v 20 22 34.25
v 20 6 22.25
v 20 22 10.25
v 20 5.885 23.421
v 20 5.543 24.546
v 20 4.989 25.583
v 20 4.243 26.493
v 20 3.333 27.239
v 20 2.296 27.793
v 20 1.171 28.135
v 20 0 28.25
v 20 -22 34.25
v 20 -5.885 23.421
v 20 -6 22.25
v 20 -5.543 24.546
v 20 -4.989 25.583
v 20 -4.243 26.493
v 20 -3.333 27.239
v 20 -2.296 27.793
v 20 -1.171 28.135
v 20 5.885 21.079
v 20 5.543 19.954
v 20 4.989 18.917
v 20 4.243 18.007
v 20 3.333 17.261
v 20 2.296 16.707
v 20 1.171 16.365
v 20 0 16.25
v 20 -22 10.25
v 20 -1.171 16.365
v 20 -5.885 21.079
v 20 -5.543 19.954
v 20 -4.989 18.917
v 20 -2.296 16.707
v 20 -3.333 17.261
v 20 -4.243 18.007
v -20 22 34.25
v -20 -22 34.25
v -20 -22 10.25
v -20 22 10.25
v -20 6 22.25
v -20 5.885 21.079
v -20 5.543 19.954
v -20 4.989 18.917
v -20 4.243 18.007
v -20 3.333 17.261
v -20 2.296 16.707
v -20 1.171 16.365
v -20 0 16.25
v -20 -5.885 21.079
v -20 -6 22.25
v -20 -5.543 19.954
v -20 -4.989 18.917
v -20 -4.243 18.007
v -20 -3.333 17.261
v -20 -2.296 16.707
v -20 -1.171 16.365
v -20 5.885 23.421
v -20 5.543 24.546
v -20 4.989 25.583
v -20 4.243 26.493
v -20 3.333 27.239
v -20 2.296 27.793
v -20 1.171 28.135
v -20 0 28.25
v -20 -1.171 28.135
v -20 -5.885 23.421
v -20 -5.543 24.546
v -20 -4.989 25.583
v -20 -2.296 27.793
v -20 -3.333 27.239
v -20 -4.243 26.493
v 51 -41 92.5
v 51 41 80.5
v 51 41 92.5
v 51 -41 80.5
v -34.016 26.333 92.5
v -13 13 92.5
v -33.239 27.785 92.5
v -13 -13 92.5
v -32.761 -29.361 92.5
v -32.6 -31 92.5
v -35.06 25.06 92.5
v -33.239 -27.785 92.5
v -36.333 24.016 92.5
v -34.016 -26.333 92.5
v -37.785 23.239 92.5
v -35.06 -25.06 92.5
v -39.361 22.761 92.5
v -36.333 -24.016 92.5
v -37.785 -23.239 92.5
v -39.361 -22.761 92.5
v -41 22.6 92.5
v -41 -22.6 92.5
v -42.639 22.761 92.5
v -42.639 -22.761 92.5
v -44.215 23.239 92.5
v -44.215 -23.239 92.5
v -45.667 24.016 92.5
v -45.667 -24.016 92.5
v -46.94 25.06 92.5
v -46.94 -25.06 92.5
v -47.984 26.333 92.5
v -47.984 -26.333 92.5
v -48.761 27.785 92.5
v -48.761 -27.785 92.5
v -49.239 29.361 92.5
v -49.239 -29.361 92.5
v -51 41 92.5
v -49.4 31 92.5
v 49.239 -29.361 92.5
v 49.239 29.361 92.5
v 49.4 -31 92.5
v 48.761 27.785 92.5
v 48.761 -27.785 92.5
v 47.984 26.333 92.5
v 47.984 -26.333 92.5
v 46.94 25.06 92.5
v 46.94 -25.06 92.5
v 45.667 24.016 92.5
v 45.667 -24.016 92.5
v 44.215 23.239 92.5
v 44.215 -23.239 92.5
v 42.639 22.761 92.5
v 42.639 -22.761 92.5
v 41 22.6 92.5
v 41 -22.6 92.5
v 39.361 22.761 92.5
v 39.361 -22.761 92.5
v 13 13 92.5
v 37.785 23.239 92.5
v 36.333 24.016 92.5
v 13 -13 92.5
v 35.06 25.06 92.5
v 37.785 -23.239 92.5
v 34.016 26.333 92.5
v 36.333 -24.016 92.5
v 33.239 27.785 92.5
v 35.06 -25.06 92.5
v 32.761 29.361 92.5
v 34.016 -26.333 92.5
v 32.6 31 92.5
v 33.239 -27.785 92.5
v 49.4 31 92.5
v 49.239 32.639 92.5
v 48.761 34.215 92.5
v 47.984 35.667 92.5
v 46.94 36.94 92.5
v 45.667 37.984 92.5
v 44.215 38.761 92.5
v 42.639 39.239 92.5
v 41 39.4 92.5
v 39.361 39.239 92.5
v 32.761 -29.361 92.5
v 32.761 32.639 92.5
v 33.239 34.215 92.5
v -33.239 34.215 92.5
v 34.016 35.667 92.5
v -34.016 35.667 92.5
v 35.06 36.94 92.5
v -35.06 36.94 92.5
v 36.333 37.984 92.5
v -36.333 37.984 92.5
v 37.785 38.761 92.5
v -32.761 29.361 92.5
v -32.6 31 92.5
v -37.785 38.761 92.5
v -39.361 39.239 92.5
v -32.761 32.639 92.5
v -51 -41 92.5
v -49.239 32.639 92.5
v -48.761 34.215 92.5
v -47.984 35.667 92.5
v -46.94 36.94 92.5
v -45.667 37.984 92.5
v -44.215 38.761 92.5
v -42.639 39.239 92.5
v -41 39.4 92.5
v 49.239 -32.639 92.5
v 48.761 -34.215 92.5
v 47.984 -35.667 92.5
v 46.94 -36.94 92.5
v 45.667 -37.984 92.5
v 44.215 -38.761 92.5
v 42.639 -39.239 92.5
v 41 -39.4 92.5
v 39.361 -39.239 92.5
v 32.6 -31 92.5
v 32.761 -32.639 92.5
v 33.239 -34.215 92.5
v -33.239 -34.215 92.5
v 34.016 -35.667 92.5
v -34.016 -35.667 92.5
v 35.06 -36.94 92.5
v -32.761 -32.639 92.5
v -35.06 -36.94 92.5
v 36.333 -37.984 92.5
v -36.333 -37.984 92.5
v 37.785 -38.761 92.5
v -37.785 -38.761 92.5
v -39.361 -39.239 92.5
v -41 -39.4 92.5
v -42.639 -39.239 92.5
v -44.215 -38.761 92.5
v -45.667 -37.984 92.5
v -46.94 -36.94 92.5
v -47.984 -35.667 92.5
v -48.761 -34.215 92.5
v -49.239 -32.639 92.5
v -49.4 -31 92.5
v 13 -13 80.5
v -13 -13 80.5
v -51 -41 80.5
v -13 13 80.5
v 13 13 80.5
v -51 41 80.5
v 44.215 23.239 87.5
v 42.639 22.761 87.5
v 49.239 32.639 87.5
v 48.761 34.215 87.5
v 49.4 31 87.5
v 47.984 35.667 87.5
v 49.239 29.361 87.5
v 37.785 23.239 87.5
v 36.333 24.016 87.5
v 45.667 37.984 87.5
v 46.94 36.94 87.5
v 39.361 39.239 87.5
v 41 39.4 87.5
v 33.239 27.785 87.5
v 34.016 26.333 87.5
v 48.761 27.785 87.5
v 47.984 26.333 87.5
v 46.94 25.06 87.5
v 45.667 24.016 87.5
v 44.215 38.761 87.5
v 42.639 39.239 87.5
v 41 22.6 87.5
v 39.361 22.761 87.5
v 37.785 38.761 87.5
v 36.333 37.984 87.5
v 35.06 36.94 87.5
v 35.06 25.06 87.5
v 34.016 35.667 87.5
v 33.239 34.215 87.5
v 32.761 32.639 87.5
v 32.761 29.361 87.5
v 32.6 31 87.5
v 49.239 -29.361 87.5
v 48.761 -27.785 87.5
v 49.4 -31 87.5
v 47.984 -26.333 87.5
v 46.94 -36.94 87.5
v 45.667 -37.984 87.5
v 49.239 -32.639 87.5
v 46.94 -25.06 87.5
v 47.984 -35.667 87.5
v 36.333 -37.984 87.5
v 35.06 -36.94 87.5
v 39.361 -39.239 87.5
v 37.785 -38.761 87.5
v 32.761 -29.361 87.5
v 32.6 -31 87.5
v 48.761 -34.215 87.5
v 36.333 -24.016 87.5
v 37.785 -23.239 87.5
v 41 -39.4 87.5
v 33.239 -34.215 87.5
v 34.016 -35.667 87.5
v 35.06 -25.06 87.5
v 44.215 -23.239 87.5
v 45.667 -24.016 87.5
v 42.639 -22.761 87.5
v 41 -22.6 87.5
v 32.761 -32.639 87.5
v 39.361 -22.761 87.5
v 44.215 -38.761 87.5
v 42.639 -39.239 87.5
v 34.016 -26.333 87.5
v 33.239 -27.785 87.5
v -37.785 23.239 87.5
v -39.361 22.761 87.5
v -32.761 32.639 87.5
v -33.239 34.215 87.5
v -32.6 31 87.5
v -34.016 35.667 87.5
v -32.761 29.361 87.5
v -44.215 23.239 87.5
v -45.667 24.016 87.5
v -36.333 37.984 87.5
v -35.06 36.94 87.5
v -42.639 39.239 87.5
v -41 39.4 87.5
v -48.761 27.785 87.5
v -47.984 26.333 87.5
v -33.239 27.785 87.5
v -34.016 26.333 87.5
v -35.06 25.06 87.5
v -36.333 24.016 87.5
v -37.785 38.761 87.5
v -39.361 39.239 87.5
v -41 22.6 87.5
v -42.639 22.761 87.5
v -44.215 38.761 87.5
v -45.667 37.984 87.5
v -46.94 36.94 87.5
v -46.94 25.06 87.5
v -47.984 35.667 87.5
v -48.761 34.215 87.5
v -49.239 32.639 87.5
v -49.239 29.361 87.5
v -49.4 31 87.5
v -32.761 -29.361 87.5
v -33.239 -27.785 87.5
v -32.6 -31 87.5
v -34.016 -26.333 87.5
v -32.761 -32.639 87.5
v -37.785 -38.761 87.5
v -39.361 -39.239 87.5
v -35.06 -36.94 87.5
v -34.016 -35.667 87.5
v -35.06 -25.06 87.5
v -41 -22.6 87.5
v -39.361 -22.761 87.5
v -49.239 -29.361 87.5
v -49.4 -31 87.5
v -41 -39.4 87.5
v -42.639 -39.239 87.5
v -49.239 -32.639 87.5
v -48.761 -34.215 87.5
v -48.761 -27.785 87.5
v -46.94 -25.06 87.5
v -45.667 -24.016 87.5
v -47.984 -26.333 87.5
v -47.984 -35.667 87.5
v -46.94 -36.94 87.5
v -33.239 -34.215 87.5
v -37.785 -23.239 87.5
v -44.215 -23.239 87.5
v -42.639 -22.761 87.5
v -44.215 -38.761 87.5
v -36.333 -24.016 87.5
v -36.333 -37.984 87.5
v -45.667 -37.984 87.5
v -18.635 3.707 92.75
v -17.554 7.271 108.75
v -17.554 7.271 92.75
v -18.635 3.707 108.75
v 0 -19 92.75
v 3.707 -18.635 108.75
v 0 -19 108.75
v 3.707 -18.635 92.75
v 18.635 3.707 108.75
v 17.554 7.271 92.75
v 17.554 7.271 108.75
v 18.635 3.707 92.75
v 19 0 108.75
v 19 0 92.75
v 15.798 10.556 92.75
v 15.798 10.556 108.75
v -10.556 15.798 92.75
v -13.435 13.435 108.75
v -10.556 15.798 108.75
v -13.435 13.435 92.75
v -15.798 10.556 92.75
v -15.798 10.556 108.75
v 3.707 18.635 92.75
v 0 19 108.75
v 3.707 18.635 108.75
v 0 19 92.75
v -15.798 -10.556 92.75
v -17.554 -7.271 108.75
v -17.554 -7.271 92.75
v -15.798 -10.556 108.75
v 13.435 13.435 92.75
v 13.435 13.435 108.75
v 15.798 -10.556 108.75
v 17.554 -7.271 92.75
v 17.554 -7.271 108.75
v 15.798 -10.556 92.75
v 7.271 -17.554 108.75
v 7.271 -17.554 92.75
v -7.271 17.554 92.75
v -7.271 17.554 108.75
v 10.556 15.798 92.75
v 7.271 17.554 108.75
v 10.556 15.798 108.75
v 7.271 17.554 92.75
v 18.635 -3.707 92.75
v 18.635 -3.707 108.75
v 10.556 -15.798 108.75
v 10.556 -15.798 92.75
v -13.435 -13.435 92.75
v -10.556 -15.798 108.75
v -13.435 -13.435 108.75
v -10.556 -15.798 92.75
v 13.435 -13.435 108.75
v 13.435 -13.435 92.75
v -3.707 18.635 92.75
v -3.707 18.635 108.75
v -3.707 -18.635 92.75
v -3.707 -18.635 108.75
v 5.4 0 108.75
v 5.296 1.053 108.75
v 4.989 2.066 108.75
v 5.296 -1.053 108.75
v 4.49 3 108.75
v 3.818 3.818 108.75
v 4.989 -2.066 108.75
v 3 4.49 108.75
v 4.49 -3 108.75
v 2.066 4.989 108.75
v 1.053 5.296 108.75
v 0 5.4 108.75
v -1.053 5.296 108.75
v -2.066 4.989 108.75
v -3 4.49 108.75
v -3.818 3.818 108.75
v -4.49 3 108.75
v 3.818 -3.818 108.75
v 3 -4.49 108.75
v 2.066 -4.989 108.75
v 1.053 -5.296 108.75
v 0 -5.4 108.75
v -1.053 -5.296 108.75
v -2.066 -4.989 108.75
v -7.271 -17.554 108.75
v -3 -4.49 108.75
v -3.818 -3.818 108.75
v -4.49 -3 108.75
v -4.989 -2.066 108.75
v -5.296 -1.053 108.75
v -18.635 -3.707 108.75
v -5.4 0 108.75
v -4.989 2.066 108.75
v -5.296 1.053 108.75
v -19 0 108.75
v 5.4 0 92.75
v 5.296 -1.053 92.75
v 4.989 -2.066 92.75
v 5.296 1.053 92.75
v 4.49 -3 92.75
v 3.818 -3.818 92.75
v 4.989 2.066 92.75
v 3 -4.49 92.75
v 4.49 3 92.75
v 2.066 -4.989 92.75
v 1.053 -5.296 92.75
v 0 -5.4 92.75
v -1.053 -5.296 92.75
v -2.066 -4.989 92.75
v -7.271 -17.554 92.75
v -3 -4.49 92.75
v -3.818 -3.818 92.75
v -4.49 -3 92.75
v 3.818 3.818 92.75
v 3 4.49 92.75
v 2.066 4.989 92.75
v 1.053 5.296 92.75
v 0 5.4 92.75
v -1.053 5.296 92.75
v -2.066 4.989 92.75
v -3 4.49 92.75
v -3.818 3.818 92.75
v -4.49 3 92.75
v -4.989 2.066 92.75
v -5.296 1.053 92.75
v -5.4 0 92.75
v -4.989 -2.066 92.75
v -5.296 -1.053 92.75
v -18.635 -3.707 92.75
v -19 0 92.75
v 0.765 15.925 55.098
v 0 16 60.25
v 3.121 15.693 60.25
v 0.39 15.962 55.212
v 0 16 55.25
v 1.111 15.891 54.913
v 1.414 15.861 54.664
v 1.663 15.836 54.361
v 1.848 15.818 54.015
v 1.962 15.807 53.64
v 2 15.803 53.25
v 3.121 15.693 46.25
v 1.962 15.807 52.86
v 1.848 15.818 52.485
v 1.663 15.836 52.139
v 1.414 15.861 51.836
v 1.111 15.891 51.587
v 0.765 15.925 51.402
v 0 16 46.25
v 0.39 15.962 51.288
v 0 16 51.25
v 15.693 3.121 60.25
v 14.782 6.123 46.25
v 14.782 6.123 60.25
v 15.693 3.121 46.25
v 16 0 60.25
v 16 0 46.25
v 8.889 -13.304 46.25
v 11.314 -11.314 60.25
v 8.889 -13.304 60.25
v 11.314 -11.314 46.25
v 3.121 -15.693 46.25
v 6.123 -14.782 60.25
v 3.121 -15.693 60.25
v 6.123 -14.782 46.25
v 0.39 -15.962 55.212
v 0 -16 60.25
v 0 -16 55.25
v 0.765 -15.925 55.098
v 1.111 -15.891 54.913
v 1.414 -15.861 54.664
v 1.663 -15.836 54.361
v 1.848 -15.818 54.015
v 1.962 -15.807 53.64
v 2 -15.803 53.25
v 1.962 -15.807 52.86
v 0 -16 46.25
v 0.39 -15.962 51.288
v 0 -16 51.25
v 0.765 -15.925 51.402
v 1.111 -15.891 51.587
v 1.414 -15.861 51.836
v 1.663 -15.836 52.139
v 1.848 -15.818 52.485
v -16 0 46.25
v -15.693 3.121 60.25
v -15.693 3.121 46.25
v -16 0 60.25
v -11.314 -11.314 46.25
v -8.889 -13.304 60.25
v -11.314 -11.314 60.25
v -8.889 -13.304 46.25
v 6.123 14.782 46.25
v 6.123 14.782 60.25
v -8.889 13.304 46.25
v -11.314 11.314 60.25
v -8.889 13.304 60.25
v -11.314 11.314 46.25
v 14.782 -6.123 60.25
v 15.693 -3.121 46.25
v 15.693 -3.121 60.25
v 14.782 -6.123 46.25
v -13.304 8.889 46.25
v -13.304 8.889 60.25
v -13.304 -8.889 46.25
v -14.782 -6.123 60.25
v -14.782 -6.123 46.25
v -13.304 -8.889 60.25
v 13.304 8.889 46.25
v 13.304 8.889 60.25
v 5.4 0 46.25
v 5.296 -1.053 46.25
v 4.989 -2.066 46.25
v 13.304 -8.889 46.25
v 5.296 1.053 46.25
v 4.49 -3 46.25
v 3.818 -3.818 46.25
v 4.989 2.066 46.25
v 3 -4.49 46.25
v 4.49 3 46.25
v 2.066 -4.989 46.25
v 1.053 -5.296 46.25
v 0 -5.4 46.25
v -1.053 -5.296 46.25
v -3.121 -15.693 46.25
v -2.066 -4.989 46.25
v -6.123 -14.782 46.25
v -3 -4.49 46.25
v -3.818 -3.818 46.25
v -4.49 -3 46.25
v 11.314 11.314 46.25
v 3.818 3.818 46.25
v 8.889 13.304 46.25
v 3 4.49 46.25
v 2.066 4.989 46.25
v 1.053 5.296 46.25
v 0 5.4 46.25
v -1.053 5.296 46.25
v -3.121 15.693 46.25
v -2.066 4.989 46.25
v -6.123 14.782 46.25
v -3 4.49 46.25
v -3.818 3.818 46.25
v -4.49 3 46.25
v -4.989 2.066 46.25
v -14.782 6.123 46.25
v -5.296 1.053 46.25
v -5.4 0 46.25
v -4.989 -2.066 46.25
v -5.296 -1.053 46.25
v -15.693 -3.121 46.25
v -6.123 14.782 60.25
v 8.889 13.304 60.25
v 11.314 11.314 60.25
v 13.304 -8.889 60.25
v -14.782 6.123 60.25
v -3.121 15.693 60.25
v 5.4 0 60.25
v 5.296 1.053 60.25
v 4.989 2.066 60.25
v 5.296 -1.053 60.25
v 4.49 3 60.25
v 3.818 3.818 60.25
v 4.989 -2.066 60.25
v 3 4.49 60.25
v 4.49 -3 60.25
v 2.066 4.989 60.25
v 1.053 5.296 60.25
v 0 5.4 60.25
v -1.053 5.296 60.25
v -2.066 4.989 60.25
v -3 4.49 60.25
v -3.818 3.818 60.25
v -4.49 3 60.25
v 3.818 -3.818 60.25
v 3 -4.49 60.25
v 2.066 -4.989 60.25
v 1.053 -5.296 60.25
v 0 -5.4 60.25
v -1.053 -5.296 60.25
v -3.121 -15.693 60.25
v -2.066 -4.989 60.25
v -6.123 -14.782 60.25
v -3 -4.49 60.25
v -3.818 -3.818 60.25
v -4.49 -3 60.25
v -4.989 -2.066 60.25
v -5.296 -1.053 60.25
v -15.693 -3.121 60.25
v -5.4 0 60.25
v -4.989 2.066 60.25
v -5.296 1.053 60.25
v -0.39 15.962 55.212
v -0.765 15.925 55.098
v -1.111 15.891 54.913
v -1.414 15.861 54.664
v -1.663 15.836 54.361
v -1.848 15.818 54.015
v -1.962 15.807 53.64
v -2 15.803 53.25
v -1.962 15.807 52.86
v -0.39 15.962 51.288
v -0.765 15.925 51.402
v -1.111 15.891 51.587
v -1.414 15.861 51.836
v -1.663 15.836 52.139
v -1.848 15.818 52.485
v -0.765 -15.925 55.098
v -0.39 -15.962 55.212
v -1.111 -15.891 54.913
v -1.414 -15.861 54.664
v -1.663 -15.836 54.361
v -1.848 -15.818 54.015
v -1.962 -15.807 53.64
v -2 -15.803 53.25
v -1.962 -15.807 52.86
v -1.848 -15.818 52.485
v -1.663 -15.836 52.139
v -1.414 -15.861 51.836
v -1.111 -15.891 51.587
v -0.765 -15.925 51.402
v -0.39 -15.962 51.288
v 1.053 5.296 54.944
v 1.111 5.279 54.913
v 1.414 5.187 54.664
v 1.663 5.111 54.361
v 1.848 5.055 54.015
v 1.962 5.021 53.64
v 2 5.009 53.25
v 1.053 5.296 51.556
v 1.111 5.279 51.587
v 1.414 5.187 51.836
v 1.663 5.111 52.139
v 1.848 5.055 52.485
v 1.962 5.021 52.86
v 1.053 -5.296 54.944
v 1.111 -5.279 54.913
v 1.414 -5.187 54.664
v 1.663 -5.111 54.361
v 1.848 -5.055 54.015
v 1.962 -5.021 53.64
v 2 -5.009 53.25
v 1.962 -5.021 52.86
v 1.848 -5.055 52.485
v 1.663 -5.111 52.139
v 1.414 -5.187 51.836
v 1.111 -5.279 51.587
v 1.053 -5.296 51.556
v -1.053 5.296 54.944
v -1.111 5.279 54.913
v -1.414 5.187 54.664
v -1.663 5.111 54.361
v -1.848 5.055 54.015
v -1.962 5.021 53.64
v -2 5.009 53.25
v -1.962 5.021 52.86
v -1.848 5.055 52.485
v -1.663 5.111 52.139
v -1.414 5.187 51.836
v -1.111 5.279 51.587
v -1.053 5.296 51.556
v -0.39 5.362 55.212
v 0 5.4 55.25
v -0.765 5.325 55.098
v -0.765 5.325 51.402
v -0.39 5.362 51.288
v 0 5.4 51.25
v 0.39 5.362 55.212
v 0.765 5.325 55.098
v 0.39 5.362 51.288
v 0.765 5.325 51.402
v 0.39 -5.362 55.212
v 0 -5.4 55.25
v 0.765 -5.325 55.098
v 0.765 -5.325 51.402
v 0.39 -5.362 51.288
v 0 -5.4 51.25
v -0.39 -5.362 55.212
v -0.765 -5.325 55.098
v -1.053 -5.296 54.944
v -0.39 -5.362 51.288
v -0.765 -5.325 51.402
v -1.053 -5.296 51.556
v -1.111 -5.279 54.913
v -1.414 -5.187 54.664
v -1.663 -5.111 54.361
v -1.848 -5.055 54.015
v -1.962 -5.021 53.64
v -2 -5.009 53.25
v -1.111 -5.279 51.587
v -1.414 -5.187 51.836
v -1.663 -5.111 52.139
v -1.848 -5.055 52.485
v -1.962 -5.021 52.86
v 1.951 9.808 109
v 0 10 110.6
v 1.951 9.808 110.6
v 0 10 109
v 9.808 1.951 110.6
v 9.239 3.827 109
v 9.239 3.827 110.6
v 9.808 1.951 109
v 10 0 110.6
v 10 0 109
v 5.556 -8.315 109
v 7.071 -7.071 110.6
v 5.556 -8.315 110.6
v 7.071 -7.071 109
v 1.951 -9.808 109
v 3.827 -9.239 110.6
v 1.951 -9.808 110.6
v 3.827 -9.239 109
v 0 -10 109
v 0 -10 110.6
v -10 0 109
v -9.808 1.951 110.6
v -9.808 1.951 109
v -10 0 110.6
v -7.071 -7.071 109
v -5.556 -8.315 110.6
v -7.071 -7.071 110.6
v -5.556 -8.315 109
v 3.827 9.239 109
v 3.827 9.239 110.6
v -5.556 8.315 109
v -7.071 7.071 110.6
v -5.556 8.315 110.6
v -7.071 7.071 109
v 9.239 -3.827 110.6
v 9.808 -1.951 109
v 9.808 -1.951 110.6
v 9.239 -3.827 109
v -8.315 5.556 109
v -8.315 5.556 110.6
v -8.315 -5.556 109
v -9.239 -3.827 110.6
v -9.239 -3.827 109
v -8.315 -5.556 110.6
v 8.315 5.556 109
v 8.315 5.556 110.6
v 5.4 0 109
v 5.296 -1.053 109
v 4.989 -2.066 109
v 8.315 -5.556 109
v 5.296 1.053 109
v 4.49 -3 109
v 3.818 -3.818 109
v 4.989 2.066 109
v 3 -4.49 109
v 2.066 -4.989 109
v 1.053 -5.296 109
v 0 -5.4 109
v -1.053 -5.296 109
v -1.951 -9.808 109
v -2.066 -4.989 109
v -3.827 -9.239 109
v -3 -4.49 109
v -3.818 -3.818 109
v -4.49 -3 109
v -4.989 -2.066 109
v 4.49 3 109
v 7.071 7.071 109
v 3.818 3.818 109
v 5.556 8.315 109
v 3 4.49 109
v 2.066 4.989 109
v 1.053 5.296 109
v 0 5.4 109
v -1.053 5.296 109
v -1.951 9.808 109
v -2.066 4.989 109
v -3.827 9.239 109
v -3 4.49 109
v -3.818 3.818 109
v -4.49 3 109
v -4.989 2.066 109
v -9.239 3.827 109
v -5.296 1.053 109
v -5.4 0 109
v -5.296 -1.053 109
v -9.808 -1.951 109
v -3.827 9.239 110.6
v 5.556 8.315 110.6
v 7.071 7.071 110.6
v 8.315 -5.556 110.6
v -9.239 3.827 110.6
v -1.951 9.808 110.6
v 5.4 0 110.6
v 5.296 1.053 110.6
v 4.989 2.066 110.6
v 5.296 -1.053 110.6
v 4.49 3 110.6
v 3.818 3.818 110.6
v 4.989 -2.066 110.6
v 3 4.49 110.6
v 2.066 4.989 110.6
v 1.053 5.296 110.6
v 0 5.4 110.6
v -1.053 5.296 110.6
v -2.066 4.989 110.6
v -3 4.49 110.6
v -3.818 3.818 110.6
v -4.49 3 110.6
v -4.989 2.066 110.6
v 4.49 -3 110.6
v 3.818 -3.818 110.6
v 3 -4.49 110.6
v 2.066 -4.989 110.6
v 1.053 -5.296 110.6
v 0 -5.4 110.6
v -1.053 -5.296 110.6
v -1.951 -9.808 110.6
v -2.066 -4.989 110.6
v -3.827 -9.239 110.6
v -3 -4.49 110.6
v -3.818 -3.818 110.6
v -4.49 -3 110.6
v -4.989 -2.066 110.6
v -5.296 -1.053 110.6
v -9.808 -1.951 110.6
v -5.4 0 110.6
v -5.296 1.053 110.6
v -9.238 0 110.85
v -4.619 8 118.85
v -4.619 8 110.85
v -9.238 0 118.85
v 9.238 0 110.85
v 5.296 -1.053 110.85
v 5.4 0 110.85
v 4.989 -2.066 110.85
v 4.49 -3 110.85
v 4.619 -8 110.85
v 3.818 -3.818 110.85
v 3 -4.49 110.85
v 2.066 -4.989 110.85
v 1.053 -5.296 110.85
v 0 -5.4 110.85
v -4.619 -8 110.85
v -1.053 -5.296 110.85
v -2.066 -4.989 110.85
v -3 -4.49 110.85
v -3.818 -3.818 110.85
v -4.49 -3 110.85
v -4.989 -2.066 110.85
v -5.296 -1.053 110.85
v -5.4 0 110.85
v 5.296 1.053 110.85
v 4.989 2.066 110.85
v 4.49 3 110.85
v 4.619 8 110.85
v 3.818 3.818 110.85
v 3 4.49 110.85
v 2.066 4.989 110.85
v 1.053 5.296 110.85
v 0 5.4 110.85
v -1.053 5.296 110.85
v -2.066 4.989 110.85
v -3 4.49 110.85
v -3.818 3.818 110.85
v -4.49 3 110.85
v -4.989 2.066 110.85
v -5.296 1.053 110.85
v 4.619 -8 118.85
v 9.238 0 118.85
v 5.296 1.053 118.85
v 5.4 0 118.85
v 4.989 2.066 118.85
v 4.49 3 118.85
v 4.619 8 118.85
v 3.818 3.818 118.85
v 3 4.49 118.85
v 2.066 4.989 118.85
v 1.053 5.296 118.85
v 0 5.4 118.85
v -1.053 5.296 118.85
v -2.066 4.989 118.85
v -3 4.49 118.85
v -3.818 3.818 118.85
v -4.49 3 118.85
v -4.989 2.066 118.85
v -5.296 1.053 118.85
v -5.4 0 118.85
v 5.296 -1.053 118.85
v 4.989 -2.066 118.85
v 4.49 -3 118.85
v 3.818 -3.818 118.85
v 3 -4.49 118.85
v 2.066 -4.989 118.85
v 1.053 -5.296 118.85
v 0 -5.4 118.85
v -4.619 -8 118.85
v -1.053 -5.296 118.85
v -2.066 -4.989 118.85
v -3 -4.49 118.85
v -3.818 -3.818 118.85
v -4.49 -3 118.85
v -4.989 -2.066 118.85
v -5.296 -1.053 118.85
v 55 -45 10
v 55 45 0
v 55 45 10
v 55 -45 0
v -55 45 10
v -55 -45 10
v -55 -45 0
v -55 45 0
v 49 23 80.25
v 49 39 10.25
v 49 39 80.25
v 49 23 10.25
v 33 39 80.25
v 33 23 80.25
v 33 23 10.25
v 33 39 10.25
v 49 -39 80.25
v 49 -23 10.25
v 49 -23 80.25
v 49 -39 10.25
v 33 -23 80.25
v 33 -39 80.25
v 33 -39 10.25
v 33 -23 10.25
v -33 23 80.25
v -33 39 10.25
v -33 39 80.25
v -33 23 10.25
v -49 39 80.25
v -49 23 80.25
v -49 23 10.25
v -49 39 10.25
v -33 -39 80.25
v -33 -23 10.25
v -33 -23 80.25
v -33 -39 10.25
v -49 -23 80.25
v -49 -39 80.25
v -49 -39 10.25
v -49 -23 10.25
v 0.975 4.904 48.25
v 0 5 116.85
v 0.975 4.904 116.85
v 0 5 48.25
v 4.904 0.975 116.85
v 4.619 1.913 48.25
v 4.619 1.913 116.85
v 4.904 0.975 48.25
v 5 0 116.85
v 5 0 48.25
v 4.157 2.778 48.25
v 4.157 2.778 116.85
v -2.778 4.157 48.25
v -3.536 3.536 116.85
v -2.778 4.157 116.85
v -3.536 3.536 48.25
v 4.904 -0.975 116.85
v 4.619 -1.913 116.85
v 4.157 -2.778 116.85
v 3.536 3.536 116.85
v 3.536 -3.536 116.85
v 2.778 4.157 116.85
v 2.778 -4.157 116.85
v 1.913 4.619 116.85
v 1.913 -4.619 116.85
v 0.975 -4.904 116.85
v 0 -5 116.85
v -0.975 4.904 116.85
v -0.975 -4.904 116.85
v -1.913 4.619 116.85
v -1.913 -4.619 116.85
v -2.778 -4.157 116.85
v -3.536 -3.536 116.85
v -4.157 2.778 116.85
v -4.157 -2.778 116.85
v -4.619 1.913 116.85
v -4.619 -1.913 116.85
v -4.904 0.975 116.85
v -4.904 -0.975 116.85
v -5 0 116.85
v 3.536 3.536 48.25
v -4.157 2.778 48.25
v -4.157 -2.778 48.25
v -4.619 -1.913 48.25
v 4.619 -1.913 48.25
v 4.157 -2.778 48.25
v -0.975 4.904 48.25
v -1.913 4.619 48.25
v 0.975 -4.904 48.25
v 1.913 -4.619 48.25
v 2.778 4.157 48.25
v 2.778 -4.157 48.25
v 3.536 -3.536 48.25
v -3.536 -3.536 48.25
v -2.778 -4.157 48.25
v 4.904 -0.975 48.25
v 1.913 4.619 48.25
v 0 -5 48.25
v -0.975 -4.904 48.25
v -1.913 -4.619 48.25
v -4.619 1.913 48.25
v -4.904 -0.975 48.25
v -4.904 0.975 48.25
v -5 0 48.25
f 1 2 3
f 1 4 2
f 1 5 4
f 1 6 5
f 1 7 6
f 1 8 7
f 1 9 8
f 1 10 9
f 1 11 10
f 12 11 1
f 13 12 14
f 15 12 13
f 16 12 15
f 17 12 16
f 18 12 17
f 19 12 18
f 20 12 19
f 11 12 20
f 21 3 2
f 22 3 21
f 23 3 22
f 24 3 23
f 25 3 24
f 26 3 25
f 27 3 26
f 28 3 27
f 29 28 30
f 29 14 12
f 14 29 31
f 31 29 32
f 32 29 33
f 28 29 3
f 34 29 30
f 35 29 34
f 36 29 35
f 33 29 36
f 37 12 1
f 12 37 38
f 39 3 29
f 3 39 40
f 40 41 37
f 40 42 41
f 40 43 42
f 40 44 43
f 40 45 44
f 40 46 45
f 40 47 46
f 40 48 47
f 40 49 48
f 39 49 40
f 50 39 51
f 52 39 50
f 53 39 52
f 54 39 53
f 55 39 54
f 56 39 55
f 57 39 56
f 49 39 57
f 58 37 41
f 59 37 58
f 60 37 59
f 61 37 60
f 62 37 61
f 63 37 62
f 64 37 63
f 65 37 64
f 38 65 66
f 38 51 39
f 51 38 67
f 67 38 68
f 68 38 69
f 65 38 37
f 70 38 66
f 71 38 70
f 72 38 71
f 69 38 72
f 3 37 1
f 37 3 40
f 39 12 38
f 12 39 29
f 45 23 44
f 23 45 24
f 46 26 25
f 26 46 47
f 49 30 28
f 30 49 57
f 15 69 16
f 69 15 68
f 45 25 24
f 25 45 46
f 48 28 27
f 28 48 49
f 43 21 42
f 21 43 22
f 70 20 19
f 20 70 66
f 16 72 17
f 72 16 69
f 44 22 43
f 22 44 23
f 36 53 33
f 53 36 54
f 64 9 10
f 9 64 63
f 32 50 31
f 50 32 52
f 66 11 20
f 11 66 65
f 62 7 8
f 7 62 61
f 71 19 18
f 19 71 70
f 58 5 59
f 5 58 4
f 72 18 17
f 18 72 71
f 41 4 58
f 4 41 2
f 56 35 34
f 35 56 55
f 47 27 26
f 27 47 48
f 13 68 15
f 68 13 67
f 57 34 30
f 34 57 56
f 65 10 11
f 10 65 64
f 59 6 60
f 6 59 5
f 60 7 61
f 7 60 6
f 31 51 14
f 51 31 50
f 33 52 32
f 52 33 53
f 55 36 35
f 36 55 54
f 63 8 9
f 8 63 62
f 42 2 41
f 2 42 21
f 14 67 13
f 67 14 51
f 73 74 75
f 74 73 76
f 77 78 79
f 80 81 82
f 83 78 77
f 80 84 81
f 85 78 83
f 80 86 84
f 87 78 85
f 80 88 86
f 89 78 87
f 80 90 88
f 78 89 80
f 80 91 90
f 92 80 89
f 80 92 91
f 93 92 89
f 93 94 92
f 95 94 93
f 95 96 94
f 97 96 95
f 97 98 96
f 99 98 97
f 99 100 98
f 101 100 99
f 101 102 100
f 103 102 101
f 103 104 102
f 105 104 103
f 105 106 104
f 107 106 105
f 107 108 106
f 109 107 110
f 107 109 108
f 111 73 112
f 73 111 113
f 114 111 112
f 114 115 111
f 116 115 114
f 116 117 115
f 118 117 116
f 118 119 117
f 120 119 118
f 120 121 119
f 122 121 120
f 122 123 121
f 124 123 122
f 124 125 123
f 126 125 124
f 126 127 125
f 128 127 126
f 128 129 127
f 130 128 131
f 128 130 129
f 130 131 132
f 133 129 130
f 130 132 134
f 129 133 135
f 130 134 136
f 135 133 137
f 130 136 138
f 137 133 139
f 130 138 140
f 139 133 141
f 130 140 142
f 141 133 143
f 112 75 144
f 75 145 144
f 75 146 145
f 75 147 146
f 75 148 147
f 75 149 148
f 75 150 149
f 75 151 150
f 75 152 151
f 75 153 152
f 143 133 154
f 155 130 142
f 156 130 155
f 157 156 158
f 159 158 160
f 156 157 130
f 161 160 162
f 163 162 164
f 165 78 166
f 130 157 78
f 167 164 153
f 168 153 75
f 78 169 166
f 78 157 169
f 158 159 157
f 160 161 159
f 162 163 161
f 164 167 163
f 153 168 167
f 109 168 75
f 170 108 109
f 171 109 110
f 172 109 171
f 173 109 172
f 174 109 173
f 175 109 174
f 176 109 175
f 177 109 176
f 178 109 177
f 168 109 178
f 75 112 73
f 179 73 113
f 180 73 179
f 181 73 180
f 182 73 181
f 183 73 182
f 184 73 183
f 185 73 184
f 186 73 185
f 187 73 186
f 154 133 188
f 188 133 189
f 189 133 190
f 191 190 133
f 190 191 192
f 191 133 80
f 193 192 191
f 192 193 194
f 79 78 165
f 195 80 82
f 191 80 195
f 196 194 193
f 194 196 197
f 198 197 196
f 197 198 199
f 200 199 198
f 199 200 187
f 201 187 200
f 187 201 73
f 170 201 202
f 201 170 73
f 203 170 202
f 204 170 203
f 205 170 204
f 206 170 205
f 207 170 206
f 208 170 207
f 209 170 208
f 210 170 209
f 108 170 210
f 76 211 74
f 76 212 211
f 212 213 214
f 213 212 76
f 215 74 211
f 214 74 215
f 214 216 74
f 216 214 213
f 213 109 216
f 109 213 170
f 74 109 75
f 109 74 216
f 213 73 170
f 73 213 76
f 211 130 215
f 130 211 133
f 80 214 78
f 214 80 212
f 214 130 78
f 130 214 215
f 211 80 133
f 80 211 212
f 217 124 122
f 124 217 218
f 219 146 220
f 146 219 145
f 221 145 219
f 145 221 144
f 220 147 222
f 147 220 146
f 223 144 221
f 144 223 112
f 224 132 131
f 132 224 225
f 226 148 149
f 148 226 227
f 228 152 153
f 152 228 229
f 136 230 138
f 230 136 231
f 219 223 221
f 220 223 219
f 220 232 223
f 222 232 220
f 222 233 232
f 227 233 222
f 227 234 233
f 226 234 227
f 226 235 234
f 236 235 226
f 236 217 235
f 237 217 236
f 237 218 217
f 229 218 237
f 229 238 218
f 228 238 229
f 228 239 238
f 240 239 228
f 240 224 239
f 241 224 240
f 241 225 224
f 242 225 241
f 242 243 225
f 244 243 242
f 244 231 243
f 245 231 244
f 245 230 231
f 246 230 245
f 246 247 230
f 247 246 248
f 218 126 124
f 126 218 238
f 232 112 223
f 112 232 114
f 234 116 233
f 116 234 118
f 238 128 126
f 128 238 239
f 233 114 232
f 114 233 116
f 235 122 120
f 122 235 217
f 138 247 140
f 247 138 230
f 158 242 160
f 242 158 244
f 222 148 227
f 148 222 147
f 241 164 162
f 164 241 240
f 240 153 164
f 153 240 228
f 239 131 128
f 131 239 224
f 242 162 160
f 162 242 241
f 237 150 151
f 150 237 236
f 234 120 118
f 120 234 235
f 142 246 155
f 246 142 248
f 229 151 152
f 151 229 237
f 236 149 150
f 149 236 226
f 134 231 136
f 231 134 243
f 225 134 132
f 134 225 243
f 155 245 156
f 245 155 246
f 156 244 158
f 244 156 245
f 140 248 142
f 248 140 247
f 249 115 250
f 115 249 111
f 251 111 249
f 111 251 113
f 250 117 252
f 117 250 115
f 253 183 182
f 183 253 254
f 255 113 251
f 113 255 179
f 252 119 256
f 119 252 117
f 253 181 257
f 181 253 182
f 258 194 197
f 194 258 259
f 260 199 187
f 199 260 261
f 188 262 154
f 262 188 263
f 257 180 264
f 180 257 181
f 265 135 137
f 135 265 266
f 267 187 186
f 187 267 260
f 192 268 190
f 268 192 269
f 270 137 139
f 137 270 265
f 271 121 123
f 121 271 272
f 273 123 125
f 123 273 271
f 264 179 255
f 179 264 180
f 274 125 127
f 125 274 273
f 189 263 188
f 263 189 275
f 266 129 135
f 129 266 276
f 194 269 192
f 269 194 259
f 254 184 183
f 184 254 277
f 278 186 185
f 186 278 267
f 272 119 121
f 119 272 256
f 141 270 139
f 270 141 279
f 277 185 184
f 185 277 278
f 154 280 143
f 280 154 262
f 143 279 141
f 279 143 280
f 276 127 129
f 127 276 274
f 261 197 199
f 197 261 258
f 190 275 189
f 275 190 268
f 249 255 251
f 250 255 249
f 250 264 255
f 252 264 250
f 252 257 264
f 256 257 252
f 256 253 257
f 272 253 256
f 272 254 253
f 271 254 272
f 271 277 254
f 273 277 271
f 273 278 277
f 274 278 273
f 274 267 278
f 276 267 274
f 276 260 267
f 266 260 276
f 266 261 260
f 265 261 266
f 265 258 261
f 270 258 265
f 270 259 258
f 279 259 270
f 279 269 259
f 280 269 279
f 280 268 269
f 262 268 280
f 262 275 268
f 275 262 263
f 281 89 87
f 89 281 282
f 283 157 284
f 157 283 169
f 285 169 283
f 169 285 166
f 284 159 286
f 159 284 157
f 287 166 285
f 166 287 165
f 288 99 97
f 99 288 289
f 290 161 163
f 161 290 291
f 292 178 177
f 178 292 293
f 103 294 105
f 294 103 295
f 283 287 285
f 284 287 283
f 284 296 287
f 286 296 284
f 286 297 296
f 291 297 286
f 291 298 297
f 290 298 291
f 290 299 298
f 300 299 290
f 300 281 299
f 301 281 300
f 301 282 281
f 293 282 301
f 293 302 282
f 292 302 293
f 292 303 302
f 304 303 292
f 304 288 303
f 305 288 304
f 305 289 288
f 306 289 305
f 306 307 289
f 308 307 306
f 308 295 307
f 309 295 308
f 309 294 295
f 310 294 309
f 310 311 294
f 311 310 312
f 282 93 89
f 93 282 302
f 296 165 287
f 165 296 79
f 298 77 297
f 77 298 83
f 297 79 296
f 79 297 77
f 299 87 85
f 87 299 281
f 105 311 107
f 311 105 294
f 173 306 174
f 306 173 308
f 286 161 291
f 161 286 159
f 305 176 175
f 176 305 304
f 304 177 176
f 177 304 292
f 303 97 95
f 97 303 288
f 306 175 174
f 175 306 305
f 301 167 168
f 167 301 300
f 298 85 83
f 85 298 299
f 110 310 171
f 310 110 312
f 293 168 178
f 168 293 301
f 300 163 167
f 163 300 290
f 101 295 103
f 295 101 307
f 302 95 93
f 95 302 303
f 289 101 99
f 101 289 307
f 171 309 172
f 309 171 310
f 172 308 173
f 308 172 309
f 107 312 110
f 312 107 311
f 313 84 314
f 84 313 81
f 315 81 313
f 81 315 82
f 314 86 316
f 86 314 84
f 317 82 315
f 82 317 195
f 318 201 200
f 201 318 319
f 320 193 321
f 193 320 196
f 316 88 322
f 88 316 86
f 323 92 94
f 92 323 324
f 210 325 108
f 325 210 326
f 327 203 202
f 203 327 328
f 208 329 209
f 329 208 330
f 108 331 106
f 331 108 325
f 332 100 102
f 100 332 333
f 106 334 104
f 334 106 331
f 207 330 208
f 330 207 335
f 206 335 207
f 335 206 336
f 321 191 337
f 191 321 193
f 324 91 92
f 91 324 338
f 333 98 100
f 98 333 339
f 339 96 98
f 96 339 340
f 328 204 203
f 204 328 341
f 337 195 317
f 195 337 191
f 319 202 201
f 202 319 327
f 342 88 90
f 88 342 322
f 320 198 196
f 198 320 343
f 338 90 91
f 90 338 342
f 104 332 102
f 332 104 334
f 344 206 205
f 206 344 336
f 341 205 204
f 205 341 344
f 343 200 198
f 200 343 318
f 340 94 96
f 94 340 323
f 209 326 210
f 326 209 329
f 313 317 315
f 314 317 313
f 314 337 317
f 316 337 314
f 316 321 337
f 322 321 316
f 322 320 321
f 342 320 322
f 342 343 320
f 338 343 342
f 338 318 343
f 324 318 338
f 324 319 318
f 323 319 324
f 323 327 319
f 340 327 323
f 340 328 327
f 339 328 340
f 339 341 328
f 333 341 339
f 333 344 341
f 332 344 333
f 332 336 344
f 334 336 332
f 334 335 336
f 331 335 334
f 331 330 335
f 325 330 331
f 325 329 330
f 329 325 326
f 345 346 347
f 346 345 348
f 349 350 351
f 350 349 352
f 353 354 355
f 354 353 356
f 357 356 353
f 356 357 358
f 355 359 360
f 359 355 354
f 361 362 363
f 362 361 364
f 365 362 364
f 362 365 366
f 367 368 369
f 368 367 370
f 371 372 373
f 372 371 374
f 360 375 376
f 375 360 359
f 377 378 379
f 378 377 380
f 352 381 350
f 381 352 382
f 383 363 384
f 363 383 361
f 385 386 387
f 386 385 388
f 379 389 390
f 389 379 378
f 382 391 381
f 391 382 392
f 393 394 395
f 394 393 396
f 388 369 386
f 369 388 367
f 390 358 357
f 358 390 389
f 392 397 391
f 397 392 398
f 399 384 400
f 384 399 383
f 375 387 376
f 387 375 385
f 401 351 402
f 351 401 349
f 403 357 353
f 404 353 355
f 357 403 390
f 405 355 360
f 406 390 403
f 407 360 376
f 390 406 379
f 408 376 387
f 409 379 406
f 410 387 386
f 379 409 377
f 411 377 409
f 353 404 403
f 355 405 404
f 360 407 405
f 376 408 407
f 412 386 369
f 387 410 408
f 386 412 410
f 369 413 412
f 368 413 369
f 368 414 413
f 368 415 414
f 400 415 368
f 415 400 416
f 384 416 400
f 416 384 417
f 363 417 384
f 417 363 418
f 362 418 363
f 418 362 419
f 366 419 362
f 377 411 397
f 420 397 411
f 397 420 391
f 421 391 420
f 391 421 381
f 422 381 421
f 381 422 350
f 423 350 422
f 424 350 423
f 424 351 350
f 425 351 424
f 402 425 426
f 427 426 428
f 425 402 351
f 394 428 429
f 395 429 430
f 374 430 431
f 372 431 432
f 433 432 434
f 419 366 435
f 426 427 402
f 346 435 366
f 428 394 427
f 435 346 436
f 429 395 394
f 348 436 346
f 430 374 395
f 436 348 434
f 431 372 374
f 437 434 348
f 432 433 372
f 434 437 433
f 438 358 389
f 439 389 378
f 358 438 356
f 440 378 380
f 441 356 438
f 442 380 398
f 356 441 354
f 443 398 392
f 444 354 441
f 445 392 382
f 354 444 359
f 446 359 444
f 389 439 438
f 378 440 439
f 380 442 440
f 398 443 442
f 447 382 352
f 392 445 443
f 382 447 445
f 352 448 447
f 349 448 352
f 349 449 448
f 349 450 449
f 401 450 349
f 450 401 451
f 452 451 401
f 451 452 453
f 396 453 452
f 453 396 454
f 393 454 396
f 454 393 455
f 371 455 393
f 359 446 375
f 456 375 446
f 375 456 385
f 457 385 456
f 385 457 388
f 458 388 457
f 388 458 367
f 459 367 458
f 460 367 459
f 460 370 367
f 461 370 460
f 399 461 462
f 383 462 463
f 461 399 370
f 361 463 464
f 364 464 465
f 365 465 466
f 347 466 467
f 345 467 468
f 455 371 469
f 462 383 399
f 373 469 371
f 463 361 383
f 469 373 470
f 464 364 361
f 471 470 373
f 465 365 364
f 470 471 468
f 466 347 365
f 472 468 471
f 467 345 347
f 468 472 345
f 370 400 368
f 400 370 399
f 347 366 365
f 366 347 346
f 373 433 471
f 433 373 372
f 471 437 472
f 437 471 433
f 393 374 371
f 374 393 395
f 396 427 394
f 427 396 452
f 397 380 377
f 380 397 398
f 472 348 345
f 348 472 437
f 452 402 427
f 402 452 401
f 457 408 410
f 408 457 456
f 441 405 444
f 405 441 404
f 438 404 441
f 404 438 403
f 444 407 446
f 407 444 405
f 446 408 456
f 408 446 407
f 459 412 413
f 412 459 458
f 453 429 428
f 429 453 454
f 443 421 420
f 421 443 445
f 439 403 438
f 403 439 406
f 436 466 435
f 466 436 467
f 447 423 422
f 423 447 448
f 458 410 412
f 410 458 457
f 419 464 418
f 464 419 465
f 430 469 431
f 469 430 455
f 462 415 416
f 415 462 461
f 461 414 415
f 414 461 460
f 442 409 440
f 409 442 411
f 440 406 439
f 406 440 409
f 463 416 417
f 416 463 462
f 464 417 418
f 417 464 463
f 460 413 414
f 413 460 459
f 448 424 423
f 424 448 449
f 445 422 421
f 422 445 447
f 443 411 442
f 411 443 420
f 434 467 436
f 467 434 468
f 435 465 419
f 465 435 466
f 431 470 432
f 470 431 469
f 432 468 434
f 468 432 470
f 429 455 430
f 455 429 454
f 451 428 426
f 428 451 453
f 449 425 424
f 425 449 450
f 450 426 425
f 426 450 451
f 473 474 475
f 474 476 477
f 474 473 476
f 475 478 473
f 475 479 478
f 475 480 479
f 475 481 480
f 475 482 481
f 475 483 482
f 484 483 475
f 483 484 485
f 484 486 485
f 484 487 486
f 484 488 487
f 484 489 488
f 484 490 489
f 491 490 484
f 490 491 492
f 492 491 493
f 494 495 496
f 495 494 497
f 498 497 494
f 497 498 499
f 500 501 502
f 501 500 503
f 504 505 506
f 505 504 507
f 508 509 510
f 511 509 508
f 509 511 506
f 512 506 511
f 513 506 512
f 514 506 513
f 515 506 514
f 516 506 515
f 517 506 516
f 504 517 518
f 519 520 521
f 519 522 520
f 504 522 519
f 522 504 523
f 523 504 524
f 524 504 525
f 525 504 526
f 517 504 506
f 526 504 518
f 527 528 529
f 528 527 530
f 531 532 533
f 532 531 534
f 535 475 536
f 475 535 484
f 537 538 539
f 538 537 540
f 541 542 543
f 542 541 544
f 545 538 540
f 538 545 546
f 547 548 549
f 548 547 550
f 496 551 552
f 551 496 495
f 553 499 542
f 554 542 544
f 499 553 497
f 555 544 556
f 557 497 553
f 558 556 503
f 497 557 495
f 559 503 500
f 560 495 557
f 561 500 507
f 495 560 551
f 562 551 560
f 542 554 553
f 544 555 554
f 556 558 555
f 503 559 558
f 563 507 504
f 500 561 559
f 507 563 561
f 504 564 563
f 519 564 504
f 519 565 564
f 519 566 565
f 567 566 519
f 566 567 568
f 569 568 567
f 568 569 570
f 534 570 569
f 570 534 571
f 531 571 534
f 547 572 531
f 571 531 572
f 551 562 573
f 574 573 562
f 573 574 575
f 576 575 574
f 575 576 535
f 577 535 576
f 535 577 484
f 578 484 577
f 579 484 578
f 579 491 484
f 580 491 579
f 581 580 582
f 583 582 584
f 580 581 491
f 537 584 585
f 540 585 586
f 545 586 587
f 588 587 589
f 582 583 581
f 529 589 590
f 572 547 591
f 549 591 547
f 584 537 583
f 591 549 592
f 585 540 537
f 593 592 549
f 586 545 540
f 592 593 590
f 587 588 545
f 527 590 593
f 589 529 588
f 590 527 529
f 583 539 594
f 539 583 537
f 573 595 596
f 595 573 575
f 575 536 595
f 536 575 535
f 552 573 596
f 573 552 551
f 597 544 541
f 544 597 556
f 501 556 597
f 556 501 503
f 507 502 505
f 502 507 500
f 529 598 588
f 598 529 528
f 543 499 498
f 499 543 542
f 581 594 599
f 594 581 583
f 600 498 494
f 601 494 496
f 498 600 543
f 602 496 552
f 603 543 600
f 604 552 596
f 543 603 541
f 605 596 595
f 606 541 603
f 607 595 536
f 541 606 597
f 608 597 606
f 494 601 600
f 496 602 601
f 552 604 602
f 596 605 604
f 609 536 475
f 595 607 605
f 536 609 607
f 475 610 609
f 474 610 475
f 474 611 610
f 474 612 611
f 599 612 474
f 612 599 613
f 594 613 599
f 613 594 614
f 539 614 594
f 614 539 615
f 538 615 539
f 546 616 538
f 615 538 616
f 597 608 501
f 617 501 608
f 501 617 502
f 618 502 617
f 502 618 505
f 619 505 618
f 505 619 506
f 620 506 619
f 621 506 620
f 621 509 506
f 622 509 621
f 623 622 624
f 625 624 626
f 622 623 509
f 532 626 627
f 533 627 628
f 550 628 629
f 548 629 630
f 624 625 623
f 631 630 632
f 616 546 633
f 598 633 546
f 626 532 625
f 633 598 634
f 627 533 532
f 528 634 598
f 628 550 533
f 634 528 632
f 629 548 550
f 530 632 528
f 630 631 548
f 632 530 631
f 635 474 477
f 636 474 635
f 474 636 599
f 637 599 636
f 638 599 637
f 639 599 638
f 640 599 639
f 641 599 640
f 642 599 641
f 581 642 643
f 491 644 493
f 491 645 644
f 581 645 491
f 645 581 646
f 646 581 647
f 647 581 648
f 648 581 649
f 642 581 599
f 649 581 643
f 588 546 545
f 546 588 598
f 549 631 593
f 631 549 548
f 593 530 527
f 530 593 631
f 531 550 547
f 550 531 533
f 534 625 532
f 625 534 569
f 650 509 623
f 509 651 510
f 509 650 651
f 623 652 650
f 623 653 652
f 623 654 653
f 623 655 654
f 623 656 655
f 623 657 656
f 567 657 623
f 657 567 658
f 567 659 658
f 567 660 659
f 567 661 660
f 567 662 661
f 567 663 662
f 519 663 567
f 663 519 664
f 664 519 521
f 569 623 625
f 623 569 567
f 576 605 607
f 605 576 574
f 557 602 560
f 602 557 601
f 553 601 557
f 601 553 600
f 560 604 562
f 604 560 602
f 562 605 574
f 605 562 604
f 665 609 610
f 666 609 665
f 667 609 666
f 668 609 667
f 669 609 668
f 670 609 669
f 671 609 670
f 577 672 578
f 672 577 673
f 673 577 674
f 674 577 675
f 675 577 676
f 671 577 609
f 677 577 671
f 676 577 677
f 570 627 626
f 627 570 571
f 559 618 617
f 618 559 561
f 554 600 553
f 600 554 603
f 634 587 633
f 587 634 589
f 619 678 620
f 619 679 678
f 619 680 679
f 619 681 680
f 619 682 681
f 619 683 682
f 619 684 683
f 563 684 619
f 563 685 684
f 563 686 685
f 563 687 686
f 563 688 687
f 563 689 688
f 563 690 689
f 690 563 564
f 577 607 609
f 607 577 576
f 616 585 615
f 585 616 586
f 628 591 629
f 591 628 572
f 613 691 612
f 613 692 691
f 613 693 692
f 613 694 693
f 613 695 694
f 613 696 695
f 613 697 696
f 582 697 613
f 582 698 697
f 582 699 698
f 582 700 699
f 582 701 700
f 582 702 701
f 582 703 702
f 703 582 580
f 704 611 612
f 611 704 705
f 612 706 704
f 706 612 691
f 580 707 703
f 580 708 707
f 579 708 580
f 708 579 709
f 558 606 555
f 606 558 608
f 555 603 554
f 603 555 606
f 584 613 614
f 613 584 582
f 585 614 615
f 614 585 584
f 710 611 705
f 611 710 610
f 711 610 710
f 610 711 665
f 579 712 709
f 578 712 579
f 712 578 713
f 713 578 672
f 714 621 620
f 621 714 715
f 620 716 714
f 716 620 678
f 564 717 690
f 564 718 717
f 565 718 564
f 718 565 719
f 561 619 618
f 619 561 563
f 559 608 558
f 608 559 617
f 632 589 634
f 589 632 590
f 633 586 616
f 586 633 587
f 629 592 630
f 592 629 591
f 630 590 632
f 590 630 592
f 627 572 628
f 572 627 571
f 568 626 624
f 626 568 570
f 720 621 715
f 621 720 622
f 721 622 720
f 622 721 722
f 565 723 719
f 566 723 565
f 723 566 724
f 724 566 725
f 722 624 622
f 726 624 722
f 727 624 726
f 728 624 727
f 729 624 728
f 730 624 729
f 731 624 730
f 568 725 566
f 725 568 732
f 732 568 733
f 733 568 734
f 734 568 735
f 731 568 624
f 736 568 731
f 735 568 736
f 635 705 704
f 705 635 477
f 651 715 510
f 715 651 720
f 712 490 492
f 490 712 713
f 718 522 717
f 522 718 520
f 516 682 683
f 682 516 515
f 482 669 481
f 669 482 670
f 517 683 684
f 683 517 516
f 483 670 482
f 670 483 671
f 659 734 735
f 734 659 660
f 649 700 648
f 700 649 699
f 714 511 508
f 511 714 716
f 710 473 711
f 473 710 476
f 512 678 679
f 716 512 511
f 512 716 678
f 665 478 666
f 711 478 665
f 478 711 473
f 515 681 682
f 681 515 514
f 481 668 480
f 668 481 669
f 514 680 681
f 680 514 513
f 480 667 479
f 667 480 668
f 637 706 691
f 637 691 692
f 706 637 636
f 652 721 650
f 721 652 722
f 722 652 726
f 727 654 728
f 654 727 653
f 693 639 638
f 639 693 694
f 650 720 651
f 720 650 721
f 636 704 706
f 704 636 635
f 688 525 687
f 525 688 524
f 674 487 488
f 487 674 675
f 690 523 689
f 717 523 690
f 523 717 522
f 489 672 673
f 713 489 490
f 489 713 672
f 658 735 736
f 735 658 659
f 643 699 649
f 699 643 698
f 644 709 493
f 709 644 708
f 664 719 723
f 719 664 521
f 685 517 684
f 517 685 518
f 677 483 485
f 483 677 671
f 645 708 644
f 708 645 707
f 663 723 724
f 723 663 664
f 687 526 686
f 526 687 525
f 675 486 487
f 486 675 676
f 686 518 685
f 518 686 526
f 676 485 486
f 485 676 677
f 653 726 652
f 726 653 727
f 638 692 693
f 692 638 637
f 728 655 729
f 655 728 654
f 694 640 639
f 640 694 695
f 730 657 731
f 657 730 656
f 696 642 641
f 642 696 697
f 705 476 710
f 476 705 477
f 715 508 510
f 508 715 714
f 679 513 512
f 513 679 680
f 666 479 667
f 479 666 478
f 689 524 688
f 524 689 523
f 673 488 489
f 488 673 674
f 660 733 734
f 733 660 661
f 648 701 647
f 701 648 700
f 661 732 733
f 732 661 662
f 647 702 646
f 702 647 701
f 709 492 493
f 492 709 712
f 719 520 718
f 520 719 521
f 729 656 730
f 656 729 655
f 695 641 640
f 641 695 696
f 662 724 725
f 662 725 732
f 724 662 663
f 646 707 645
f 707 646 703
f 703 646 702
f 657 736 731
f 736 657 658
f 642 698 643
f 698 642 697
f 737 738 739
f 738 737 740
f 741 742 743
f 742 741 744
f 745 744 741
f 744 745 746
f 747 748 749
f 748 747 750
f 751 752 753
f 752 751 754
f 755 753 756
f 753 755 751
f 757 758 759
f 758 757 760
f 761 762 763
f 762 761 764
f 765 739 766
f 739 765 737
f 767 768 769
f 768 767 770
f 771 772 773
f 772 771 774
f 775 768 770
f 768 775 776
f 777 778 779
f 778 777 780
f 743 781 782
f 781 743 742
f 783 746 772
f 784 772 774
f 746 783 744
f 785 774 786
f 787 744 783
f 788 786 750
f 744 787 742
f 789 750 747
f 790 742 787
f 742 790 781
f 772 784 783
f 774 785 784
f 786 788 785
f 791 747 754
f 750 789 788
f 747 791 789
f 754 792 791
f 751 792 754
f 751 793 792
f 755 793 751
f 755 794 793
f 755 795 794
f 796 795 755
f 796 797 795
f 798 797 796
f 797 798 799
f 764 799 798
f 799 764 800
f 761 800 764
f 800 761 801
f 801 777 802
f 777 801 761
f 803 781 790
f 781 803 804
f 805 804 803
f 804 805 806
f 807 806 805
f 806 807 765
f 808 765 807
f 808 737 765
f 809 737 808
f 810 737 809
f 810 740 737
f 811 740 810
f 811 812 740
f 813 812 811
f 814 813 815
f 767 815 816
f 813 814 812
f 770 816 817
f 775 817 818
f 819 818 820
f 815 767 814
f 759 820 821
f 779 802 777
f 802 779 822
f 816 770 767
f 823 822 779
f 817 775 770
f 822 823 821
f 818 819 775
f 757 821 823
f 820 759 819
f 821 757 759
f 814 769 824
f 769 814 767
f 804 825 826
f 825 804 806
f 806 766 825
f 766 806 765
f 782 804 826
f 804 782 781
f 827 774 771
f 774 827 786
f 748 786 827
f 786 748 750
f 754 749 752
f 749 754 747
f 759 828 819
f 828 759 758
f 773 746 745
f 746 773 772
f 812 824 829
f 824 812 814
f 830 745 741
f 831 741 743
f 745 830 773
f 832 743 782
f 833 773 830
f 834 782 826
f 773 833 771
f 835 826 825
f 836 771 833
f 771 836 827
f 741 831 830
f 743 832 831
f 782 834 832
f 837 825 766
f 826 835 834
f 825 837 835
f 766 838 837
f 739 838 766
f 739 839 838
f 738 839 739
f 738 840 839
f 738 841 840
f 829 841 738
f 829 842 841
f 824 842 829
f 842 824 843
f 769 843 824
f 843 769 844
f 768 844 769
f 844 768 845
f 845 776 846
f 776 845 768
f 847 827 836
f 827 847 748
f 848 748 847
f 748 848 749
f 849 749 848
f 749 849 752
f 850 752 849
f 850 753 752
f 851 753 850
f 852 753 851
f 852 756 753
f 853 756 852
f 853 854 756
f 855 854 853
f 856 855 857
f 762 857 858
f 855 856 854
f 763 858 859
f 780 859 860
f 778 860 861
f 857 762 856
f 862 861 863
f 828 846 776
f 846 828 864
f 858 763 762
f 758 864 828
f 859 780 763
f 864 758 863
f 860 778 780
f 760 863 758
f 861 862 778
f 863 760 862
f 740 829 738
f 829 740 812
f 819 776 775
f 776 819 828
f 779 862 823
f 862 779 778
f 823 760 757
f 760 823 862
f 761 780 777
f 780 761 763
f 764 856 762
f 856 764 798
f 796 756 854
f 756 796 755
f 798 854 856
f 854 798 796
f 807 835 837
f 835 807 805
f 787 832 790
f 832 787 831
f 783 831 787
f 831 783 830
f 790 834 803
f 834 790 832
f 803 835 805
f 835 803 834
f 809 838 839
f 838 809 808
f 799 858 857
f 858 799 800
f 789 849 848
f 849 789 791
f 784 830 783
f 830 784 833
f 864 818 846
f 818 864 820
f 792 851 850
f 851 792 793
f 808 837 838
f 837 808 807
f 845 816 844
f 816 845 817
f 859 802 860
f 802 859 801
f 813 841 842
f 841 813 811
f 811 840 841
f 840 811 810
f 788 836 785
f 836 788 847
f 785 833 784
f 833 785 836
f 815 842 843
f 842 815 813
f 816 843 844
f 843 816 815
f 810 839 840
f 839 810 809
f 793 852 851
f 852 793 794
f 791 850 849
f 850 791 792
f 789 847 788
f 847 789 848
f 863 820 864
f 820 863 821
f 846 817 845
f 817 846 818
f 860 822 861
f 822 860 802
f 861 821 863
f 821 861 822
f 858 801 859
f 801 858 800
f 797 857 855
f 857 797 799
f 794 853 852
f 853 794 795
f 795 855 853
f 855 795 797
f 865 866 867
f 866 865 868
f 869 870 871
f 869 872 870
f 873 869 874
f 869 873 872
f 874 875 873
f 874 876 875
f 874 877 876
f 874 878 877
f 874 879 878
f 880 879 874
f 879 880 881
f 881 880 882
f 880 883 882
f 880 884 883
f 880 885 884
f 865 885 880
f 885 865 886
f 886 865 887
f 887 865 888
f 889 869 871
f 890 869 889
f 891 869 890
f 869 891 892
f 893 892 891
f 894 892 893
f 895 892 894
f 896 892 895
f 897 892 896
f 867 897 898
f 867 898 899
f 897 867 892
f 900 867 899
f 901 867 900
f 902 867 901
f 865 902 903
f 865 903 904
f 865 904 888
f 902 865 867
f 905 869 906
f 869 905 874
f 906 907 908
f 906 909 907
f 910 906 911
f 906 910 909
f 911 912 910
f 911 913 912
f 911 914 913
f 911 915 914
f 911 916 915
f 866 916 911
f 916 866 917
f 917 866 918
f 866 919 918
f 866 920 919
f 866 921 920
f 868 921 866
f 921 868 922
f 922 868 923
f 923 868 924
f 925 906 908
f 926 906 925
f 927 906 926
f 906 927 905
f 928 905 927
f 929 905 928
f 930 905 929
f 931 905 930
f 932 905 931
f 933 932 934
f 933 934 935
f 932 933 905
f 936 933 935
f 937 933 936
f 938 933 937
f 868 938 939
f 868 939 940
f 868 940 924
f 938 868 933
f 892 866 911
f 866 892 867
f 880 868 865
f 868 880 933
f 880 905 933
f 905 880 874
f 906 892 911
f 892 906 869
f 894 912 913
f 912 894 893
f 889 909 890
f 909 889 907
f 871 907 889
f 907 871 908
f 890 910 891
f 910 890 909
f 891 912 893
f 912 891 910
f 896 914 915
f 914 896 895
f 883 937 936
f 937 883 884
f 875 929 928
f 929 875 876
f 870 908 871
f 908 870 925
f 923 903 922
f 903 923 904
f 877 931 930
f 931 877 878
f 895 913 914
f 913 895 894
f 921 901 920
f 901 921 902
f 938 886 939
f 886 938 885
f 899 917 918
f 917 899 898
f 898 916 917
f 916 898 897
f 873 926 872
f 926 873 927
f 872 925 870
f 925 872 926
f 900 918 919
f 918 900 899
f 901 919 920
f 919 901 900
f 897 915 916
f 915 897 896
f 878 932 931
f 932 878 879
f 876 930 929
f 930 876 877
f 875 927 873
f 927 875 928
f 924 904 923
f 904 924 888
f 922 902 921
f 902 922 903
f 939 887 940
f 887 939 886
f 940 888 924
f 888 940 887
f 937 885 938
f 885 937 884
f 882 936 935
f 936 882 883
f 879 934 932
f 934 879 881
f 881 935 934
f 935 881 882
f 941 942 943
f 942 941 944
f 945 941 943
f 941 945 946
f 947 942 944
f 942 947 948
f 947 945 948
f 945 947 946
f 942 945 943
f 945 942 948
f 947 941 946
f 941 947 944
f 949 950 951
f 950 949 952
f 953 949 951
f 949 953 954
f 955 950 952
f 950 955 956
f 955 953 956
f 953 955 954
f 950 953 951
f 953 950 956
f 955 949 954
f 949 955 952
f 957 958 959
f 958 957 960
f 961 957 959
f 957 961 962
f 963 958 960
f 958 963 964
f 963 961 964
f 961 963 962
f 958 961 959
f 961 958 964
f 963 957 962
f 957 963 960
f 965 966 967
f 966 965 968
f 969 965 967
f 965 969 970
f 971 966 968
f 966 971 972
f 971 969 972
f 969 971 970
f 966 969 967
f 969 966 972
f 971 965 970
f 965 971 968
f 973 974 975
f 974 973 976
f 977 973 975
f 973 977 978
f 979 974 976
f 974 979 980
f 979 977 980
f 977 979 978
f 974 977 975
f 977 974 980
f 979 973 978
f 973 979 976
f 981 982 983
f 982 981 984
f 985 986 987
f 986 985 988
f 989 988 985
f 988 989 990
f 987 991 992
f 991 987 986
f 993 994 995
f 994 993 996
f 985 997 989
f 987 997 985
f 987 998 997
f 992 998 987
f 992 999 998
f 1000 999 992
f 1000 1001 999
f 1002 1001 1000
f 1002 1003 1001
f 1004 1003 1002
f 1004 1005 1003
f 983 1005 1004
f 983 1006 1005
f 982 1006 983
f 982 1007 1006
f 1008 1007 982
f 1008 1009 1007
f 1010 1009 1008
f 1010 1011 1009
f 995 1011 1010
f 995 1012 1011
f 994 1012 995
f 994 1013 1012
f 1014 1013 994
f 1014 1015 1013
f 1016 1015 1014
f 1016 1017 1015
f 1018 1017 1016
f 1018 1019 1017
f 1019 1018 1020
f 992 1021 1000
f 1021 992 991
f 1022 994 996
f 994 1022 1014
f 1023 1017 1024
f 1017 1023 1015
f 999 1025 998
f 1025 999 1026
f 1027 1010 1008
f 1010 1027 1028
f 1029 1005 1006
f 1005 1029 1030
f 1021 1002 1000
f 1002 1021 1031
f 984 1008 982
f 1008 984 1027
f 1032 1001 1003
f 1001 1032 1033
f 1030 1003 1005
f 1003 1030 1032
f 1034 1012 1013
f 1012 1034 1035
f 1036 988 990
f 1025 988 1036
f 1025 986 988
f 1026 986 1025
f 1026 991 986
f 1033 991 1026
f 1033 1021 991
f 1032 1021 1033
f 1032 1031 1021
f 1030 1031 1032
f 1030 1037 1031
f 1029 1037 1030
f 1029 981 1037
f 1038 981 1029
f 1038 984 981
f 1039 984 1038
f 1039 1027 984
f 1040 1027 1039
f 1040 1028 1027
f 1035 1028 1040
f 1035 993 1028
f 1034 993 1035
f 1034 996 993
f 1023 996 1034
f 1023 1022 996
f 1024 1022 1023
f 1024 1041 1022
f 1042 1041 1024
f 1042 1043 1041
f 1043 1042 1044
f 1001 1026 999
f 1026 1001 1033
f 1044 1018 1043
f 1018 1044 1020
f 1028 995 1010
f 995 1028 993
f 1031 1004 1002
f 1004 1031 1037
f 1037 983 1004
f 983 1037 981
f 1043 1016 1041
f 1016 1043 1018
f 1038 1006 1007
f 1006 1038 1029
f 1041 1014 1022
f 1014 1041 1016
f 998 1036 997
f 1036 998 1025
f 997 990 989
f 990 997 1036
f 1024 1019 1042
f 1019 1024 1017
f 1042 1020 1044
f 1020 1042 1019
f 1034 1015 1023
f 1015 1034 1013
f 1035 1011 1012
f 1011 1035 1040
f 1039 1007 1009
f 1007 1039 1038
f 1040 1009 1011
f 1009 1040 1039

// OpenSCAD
$fn = 32;

// ------------------------------------------------------------------------
// Arbor press fixture: screw d10, posts 70 mm, gap 12 mm
// Every part is its own module, assembly() places every instance.
// ------------------------------------------------------------------------

// --- part 1 ---
module press_bed() {
  difference() {
    translate([-55, -45, 0]) cube([110, 90, 10]);
  }
}

// --- part 2 ---
module anvil_block() {
  difference() {
    translate([-20, -22, 0]) cube([40, 44, 24]);
    translate([0, 0, 12]) rotate([0, 90, 0]) cylinder(h = 42, d = 12, center = true);
  }
}

// --- part 3 ---
module press_post_a() {
  translate([-8, -8, 0]) cube([16, 16, 70]);
}

// --- part 4 ---
module press_post_b() {
  translate([-8, -8, 0]) cube([16, 16, 70]);
}

// --- part 5 ---
module press_post_c() {
  translate([-8, -8, 0]) cube([16, 16, 70]);
}

// --- part 6 ---
module press_post_d() {
  translate([-8, -8, 0]) cube([16, 16, 70]);
}

// --- part 7 ---
module press_frame() {
  difference() {
    translate([-51, -41, 0]) cube([102, 82, 12]);
    translate([-13, -13, -1]) cube([26, 26, 14]);
    translate([41, 31, 7]) cylinder(h = 6, d = 16.8);
    translate([41, -31, 7]) cylinder(h = 6, d = 16.8);
    translate([-41, 31, 7]) cylinder(h = 6, d = 16.8);
    translate([-41, -31, 7]) cylinder(h = 6, d = 16.8);
  }
}

// --- part 8 ---
module guide_ring() {
  difference() {
      translate([0, 0, 0]) cylinder(h = 16, d = 38);
      translate([0, 0, -1]) cylinder(h = 18, d = 10.8);
    }
}

// --- part 9 ---
module press_screw() {
  translate([0, 0, -34.3]) cylinder(h = 68.6, d = 10);
}

// --- part 10 ---
module press_head() {
  difference() {
    cylinder(h = 14, d = 32);
    translate([0, 0, -1]) cylinder(h = 16, d = 10.8);
    translate([0, 0, 7]) rotate([90, 0, 0]) cylinder(h = 34, d = 4, center = true);
  }
}

// --- part 11 ---
module nut_washer() {
  difference() {
      translate([0, 0, 0]) cylinder(h = 1.6, d = 20);
      translate([0, 0, -1]) cylinder(h = 3.6, d = 10.8);
    }
}

// --- part 12 ---
module press_nut() {
  difference() {
    linear_extrude(height = 8) polygon(points = [[9.238, 0], [4.619, 8], [-4.619, 8], [-9.238, 0], [-4.619, -8], [4.619, -8]]);
    translate([0, 0, -1]) cylinder(h = 10, d = 10.8);
  }
}

// --- assembly ---
module assembly() {
  color([0.80, 0.24, 0.20]) translate([0, 0, 0]) rotate([0, 0, 0]) press_bed();
  color([0.20, 0.45, 0.75]) translate([0, 0, 10.25]) rotate([0, 0, 0]) anvil_block();
  color([0.25, 0.62, 0.32]) translate([41, 31, 10.25]) rotate([0, 0, 0]) press_post_a();
  color([0.92, 0.70, 0.18]) translate([41, -31, 10.25]) rotate([0, 0, 0]) press_post_b();
  color([0.58, 0.35, 0.70]) translate([-41, 31, 10.25]) rotate([0, 0, 0]) press_post_c();
  color([0.16, 0.66, 0.66]) translate([-41, -31, 10.25]) rotate([0, 0, 0]) press_post_d();
  color([0.85, 0.48, 0.18]) translate([0, 0, 80.5]) rotate([0, 0, 0]) press_frame();
  color([0.55, 0.60, 0.65]) translate([0, 0, 92.75]) rotate([0, 0, 0]) guide_ring();
  color([0.75, 0.30, 0.55]) translate([0, 0, 82.55]) rotate([0, 0, 0]) press_screw();
  color([0.42, 0.52, 0.28]) translate([0, 0, 46.25]) rotate([0, 0, 0]) press_head();
  color([0.80, 0.24, 0.20]) translate([0, 0, 109]) rotate([0, 0, 0]) nut_washer();
  color([0.20, 0.45, 0.75]) translate([0, 0, 110.85]) rotate([0, 0, 0]) press_nut();
}

assembly();
